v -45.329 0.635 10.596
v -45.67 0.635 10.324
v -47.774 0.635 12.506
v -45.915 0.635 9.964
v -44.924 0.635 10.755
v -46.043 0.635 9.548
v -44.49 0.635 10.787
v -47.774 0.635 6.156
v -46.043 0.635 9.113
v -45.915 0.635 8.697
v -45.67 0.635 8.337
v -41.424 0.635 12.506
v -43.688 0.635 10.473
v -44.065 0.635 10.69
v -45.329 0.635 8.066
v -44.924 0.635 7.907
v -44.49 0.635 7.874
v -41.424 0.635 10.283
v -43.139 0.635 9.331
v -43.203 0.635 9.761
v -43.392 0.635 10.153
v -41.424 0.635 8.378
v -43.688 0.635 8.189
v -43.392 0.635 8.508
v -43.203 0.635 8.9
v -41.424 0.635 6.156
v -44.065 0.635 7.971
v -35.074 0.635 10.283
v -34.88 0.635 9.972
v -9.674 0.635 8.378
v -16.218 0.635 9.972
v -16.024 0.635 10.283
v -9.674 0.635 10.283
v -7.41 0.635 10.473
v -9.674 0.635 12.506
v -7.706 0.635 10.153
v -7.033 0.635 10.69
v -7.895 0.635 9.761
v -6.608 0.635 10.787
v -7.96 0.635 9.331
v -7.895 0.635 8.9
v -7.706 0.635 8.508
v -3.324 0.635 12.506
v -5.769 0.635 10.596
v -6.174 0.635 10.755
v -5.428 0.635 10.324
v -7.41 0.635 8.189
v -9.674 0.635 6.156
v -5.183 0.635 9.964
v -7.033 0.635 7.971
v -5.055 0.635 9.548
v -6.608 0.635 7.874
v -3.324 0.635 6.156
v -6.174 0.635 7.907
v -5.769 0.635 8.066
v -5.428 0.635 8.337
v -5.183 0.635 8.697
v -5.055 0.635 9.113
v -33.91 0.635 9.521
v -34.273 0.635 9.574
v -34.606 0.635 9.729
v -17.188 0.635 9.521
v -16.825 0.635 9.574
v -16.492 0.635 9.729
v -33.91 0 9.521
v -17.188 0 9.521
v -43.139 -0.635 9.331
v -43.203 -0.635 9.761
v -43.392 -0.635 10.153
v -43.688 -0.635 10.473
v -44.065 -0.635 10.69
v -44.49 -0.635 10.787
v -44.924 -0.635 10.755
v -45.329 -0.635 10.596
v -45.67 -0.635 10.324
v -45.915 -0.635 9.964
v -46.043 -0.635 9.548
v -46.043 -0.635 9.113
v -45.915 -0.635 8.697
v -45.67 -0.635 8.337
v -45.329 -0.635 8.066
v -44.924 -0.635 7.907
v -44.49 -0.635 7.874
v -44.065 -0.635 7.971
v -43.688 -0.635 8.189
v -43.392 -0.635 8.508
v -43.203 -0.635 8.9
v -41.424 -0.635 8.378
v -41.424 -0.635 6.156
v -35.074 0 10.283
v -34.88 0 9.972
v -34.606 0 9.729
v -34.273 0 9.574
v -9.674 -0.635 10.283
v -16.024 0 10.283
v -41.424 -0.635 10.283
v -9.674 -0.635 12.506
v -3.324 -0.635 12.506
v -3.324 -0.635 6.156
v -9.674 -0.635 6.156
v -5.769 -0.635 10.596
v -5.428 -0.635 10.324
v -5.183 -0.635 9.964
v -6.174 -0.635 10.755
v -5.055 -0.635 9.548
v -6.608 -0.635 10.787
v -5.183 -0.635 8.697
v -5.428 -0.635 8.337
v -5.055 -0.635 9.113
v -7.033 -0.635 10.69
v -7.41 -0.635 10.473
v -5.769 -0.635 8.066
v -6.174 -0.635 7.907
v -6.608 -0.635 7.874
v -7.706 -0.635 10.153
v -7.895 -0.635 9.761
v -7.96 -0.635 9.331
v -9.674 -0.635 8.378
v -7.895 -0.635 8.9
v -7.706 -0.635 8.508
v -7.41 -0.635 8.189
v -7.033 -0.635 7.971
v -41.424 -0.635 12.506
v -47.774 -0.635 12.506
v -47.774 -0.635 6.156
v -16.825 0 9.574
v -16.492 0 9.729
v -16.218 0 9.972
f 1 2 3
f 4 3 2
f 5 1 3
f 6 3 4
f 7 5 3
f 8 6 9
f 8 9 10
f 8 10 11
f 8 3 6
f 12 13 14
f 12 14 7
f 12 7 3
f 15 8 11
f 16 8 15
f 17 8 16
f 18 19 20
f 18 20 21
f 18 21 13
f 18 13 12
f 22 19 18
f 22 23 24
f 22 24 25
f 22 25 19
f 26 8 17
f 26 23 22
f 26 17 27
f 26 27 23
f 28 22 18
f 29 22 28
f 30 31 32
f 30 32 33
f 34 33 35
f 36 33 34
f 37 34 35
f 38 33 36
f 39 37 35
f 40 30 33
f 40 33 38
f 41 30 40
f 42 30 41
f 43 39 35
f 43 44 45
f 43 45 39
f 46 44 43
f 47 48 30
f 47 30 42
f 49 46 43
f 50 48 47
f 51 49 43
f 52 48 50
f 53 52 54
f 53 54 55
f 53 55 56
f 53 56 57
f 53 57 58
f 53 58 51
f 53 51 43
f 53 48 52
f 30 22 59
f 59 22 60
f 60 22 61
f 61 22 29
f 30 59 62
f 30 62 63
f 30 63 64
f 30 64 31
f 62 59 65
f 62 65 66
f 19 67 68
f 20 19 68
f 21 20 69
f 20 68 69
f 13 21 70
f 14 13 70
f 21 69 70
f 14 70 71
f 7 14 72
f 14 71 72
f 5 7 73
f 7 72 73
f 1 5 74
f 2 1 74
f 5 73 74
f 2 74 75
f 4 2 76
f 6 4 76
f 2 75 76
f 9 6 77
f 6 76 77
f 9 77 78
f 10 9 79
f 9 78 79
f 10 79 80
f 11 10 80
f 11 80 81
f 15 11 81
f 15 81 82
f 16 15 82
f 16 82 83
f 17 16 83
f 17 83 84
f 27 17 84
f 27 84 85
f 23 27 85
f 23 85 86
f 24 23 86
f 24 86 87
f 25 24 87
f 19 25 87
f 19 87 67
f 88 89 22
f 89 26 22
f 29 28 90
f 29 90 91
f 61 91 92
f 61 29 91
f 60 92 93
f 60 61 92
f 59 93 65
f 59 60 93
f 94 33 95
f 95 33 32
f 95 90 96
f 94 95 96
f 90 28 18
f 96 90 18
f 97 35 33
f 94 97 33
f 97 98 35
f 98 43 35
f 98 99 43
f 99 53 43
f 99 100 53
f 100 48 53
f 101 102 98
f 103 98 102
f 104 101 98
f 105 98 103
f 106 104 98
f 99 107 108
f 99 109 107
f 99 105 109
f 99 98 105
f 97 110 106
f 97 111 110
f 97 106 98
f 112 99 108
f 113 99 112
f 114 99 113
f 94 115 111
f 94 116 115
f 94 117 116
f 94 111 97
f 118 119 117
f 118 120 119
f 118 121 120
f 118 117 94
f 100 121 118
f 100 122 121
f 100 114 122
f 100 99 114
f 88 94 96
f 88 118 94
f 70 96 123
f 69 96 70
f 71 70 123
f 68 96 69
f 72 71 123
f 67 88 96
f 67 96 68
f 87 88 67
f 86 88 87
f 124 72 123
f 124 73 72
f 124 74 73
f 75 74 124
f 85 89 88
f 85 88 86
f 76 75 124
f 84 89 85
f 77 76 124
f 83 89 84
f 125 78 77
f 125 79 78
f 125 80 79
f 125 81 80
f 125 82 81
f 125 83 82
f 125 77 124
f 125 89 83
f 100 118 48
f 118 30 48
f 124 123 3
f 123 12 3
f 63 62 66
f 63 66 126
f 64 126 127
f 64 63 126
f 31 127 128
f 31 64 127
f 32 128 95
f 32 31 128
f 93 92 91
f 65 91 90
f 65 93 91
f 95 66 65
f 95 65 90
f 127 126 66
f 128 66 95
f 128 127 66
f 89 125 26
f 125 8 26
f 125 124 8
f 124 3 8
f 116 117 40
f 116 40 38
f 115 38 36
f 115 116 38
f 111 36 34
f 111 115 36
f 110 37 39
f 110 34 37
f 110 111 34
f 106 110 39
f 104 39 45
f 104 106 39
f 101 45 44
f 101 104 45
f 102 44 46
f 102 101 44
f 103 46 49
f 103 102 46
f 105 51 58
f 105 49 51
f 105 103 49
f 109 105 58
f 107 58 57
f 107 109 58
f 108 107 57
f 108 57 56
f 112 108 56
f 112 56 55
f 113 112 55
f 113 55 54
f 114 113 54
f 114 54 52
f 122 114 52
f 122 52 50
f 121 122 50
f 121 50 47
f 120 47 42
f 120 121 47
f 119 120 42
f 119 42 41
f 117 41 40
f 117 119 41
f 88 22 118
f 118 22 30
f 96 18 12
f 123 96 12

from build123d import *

# Parameters (mm, degrees)
BOSS_EXTRUDE1_DEPTH          = 0.635
F_97_0_0059_DIAMETER_HOLE1_D = 2.921
SKETCH5_W                    = 19.05
SKETCH5_H                    = 0.762
CUT_EXTRUDE1_DEPTH           = 0.635
FILLET4_R                    = 1.27
FILLET5_R                    = 1.27


with BuildPart() as part:
    # Sketch1 → Boss-Extrude1 (new, symmetric)
    with BuildSketch(Plane(origin=(0, 0, 0), x_dir=(1, 0, 0), z_dir=(0, 1, 0))):
        Polygon((-41.424046485, -10.283259465), (-41.424046485, -12.505759465), (-47.774046485, -12.505759465), (-47.774046485, -6.155759465), (-41.424046485, -6.155759465), (-41.424046485, -8.378259465), (-9.674046485, -8.378259465), (-9.674046485, -6.155759465), (-3.324046485, -6.155759465), (-3.324046485, -12.505759465), (-9.674046485, -12.505759465), (-9.674046485, -10.283259465), align=None)
    extrude(amount=BOSS_EXTRUDE1_DEPTH, both=True)

    # #97 (0.0059) Diameter Hole1 (through all)
    with Locations(Plane(origin=(0, 0.635, 0), x_dir=(-1, 0, 0), z_dir=(0, 1, 0))):
        with Locations((44.599046485, 9.330759465)):
            f_97_0_0059_diameter_hole1 = Hole(F_97_0_0059_DIAMETER_HOLE1_D / 2)

    # Mirror1: #97 (0.0059) Diameter Hole1 across plane
    add(f_97_0_0059_diameter_hole1.mirror(Plane(origin=(-25.549046485, 0, 0), x_dir=(0, 0, 1), z_dir=(1, 0, 0))), mode=Mode.SUBTRACT)

    # Sketch5 → Cut-Extrude1 (cut)
    with BuildSketch(Plane(origin=(0, 0.635, 0), x_dir=(1, 0, 0), z_dir=(0, 1, 0))):
        with Locations((-25.549046485, -9.902259465)):
            Rectangle(SKETCH5_W, SKETCH5_H)
    extrude(amount=-CUT_EXTRUDE1_DEPTH, mode=Mode.SUBTRACT)

    # Fillet4
    # the kernel refuses this fillet: 1.27 mm, written as the material it adds along each edge
    with BuildSketch(Plane(origin=(-35.074046485, 0.635, 9.521259465), x_dir=(0, 0, 1), z_dir=(0, -1, 0))) as fillet4_piece_1:
        with BuildLine():
            CenterArc((1.27, -1.163974227), FILLET4_R, 113.578178478, 66.421821522)
            Line((0, -1.163974227), (-0.0254, -1.163974227))
            Line((-0.0254, -1.163974227), (-0.0254, 0))
            Line((-0.0254, 0), (0, 0.0254))
            ThreePointArc((0, 0.0254), (0.381, 0.0254), (0.75184, 0.023279485))
            Line((0.75184, 0.023279485), (0.762, 0))
        make_face()
    extrude(amount=0.635)

    # Fillet5
    # the kernel refuses this fillet: 1.27 mm, written as the material it adds along each edge
    with BuildSketch(Plane(origin=(-16.024046485, 0.635, 9.521259465), x_dir=(-1, 0, 0), z_dir=(0, -1, 0))) as fillet5_piece_1:
        with BuildLine():
            CenterArc((1.163974227, -1.27), FILLET5_R, 90, 66.421821522)
            Line((0, -0.762), (-0.023279485, -0.75184))
            ThreePointArc((-0.023279485, -0.75184), (-0.0254, -0.381), (-0.0254, 0))
            Line((-0.0254, 0), (0, 0.0254))
            Line((0, 0.0254), (1.163974227, 0.0254))
            Line((1.163974227, 0.0254), (1.163974227, 0))
        make_face()
    extrude(amount=0.635)


solid = part.part
